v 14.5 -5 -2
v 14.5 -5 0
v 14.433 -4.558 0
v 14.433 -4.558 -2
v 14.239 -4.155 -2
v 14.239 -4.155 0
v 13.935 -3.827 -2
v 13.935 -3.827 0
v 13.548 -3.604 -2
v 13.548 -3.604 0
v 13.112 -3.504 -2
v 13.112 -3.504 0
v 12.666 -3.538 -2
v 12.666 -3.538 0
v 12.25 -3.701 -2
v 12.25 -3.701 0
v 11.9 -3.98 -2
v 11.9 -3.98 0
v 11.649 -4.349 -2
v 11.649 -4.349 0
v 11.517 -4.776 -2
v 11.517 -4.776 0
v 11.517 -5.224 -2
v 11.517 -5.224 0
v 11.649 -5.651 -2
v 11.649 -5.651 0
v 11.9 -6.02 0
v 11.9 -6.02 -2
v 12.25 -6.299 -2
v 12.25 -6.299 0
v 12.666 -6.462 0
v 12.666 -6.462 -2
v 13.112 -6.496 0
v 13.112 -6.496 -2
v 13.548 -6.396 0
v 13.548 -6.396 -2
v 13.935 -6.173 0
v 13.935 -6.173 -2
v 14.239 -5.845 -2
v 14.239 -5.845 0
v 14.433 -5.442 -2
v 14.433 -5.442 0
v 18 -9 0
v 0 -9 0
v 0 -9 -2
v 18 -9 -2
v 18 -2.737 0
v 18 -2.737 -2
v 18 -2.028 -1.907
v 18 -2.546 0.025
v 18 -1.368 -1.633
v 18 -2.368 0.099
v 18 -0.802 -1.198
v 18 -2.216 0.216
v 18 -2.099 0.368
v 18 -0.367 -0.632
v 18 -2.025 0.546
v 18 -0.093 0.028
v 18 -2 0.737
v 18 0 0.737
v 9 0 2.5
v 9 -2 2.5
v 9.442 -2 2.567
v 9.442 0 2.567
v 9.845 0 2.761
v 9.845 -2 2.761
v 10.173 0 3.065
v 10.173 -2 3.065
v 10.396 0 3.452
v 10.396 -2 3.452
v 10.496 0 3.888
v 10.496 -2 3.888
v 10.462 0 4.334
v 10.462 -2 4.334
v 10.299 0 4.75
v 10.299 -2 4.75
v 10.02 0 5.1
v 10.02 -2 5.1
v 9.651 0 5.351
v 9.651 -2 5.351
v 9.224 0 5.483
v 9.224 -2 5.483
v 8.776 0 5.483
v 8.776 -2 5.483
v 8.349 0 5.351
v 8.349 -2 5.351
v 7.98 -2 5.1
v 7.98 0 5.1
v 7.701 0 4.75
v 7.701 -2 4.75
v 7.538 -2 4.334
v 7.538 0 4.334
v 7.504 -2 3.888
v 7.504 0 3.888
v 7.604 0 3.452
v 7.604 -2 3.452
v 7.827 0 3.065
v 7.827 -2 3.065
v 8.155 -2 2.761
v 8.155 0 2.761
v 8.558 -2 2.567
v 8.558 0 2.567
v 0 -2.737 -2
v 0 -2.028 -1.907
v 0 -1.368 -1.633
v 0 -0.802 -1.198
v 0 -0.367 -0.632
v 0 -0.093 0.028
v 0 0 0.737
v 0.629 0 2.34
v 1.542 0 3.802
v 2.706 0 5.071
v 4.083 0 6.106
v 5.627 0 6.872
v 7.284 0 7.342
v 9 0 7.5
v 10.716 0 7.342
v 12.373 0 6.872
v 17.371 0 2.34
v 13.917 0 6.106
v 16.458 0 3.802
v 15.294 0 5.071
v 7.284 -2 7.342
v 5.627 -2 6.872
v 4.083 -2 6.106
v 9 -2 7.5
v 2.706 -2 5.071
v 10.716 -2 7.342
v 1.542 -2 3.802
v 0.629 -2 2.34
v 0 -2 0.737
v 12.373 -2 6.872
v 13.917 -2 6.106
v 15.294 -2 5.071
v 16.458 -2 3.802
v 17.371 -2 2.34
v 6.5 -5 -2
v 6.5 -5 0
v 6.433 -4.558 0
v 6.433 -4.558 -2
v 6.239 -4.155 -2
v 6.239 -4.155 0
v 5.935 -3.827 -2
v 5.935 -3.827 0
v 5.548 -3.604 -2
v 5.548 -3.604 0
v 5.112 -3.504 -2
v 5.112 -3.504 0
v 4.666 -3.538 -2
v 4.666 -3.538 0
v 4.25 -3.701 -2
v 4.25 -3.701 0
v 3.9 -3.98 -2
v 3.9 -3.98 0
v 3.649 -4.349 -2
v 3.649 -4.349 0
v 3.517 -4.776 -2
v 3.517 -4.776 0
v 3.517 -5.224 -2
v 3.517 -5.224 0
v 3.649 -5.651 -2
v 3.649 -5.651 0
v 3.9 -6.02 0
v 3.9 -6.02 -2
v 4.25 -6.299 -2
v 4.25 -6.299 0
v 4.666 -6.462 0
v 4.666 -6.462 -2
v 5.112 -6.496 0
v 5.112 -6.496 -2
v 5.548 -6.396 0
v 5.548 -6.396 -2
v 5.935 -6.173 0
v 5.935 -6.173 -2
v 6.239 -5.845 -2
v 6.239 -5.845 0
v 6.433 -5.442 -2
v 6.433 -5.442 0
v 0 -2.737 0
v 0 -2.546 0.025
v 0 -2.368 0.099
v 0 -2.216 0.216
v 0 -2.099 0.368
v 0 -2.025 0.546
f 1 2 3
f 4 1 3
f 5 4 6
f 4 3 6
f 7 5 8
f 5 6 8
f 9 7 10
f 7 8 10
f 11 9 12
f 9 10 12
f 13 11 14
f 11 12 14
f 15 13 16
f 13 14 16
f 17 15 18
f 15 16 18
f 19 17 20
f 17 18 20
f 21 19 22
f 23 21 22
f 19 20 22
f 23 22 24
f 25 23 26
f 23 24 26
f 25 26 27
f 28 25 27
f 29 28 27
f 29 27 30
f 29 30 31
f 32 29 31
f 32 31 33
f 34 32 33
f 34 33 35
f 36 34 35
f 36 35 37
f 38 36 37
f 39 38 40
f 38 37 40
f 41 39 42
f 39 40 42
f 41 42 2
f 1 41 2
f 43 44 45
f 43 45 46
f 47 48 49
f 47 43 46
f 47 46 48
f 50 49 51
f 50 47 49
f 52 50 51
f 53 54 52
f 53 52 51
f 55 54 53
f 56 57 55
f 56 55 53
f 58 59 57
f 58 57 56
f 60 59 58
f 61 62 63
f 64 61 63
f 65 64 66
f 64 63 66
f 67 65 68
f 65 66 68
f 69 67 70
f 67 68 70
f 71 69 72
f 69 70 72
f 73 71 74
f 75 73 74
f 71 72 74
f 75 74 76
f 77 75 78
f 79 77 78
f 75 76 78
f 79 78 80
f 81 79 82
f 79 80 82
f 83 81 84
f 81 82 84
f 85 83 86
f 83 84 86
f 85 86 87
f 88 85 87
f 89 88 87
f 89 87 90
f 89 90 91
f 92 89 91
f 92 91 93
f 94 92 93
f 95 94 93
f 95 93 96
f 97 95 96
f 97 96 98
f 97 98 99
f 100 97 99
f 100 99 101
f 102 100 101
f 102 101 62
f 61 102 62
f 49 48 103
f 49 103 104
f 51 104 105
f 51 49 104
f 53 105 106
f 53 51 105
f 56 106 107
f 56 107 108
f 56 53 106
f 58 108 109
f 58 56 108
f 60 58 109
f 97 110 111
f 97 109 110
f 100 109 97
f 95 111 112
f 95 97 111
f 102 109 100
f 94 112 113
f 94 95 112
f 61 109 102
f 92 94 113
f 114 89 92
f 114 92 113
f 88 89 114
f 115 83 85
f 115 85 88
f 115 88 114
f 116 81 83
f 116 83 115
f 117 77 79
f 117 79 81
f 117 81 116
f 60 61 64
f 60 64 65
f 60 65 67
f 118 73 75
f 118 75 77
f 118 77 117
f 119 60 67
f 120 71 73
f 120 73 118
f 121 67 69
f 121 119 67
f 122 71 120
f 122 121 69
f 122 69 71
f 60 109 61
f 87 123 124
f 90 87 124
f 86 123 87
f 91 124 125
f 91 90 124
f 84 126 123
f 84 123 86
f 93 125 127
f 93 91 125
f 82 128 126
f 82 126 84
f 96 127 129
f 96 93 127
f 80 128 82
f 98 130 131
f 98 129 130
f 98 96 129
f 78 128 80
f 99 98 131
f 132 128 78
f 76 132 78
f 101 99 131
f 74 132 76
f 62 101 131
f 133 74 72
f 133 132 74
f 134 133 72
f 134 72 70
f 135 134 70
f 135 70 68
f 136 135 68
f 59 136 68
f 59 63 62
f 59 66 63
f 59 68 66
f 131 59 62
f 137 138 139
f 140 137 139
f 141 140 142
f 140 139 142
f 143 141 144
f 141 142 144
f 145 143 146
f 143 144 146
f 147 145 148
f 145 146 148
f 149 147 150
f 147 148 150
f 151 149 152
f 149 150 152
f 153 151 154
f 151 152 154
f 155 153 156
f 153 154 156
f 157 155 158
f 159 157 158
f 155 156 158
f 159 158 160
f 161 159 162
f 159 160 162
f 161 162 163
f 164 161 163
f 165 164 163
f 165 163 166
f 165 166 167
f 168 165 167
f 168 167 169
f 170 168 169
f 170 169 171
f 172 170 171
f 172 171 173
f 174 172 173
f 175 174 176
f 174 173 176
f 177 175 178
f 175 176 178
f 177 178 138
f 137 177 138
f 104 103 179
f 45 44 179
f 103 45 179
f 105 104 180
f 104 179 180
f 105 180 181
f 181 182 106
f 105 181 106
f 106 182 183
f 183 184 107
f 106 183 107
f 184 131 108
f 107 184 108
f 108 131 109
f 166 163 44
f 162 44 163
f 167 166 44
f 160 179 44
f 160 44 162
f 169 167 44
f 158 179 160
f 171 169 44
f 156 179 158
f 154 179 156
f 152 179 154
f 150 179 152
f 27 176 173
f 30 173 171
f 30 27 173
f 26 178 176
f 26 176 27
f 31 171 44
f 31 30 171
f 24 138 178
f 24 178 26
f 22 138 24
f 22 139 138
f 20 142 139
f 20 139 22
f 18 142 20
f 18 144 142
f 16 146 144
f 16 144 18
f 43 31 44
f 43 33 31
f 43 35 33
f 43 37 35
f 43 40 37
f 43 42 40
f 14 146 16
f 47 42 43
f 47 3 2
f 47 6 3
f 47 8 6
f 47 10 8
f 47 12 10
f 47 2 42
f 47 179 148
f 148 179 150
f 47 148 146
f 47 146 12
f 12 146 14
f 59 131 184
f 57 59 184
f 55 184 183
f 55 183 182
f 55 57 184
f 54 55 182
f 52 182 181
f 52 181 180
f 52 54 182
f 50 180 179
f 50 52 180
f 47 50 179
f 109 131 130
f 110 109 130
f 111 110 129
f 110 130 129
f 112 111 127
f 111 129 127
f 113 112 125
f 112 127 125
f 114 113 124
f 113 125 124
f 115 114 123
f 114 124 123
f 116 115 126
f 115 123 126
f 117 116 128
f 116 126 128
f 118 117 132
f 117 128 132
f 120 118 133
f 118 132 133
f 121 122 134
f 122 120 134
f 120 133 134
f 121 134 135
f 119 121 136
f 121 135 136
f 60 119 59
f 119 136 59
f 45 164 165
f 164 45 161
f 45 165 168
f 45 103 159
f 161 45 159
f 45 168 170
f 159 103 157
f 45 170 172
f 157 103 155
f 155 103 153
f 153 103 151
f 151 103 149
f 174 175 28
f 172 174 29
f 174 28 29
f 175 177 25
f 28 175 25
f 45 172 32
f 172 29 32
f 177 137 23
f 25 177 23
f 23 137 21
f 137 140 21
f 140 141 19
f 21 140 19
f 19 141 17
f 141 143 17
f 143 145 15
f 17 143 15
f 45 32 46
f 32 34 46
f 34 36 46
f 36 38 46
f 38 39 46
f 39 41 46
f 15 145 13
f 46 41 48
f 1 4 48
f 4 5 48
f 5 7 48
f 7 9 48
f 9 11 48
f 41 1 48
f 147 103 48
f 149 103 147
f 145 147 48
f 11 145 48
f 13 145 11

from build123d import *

# Parameters (mm, degrees)
SKETCH_1_W                       = 18
SKETCH_1_H                       = 9
SKETCH_1_R                       = 1.5
SM_BASE_FLANGE_1_DEPTH           = 2
SM_EDGE_FLANGE_1_STRIP_W         = 9.4732
SM_EDGE_FLANGE_1_STRIP_H         = 2
SM_EDGE_FLANGE_1_STRIP_CUT_DEPTH = 18
SM_EDGE_FLANGE_1_DEPTH           = 18
SKETCH_9_R                       = 1.5
CUT_EXTRUDE_1_DEPTH              = 10


# Sheet-metal steps are written as plain solids
with BuildPart() as part:
    # Sketch 1 → 基体-法兰1 (new body)
    with BuildSketch(Plane.XY):
        with Locations((9, -4.5)):
            Rectangle(SKETCH_1_W, SKETCH_1_H)
        with Locations((5, -5)):
            Circle(SKETCH_1_R, mode=Mode.SUBTRACT)
        with Locations((13, -5)):
            Circle(SKETCH_1_R, mode=Mode.SUBTRACT)
    extrude(amount=-SM_BASE_FLANGE_1_DEPTH)

    # 边线-法兰1 strip (across the edge) → 边线-法兰1 strip cut (cut)
    with BuildSketch(Plane(origin=(18, 0, 0), x_dir=(0, -1, 0), z_dir=(-1, 0, 0))):
        with Locations((-2, -1)):
            Rectangle(SM_EDGE_FLANGE_1_STRIP_W, SM_EDGE_FLANGE_1_STRIP_H)
    extrude(amount=SM_EDGE_FLANGE_1_STRIP_CUT_DEPTH, mode=Mode.SUBTRACT)

    # 边线-法兰1 section (across the edge) → 边线-法兰1 (add)
    with BuildSketch(Plane(origin=(18, 0, 0), x_dir=(0, -1, 0), z_dir=(-1, 0, 0))):
        with BuildLine():
            Line((0, 0.7366), (0, 18))
            Line((0, 18), (2, 18))
            Line((2, 18), (2, 0.7366))
            ThreePointArc((2, 0.7366), (2.215745145, 0.215745145), (2.7366, 0))
            Line((2.7366, 0), (2.7366, -2))
            ThreePointArc((2.7366, -2), (0.801531583, -1.198468417), (0, 0.7366))
        make_face()
    extrude(amount=SM_EDGE_FLANGE_1_DEPTH)

    # 草图9 → 切除-拉伸1 (cut)
    with BuildSketch(Plane.XZ.offset(2)):
        with Locations(Location((9, 4, 0), (0, 0, 270))):
            Circle(SKETCH_9_R)
        with BuildLine():
            Line((18, 0.7366), (18, 18))
            Line((18, 18), (0, 18))
            Line((0, 18), (0, 0.7366))
            ThreePointArc((0, 0.7366), (9, 7.5), (18, 0.7366))
        make_face()
    extrude(amount=-CUT_EXTRUDE_1_DEPTH, mode=Mode.SUBTRACT)


solid = part.part
